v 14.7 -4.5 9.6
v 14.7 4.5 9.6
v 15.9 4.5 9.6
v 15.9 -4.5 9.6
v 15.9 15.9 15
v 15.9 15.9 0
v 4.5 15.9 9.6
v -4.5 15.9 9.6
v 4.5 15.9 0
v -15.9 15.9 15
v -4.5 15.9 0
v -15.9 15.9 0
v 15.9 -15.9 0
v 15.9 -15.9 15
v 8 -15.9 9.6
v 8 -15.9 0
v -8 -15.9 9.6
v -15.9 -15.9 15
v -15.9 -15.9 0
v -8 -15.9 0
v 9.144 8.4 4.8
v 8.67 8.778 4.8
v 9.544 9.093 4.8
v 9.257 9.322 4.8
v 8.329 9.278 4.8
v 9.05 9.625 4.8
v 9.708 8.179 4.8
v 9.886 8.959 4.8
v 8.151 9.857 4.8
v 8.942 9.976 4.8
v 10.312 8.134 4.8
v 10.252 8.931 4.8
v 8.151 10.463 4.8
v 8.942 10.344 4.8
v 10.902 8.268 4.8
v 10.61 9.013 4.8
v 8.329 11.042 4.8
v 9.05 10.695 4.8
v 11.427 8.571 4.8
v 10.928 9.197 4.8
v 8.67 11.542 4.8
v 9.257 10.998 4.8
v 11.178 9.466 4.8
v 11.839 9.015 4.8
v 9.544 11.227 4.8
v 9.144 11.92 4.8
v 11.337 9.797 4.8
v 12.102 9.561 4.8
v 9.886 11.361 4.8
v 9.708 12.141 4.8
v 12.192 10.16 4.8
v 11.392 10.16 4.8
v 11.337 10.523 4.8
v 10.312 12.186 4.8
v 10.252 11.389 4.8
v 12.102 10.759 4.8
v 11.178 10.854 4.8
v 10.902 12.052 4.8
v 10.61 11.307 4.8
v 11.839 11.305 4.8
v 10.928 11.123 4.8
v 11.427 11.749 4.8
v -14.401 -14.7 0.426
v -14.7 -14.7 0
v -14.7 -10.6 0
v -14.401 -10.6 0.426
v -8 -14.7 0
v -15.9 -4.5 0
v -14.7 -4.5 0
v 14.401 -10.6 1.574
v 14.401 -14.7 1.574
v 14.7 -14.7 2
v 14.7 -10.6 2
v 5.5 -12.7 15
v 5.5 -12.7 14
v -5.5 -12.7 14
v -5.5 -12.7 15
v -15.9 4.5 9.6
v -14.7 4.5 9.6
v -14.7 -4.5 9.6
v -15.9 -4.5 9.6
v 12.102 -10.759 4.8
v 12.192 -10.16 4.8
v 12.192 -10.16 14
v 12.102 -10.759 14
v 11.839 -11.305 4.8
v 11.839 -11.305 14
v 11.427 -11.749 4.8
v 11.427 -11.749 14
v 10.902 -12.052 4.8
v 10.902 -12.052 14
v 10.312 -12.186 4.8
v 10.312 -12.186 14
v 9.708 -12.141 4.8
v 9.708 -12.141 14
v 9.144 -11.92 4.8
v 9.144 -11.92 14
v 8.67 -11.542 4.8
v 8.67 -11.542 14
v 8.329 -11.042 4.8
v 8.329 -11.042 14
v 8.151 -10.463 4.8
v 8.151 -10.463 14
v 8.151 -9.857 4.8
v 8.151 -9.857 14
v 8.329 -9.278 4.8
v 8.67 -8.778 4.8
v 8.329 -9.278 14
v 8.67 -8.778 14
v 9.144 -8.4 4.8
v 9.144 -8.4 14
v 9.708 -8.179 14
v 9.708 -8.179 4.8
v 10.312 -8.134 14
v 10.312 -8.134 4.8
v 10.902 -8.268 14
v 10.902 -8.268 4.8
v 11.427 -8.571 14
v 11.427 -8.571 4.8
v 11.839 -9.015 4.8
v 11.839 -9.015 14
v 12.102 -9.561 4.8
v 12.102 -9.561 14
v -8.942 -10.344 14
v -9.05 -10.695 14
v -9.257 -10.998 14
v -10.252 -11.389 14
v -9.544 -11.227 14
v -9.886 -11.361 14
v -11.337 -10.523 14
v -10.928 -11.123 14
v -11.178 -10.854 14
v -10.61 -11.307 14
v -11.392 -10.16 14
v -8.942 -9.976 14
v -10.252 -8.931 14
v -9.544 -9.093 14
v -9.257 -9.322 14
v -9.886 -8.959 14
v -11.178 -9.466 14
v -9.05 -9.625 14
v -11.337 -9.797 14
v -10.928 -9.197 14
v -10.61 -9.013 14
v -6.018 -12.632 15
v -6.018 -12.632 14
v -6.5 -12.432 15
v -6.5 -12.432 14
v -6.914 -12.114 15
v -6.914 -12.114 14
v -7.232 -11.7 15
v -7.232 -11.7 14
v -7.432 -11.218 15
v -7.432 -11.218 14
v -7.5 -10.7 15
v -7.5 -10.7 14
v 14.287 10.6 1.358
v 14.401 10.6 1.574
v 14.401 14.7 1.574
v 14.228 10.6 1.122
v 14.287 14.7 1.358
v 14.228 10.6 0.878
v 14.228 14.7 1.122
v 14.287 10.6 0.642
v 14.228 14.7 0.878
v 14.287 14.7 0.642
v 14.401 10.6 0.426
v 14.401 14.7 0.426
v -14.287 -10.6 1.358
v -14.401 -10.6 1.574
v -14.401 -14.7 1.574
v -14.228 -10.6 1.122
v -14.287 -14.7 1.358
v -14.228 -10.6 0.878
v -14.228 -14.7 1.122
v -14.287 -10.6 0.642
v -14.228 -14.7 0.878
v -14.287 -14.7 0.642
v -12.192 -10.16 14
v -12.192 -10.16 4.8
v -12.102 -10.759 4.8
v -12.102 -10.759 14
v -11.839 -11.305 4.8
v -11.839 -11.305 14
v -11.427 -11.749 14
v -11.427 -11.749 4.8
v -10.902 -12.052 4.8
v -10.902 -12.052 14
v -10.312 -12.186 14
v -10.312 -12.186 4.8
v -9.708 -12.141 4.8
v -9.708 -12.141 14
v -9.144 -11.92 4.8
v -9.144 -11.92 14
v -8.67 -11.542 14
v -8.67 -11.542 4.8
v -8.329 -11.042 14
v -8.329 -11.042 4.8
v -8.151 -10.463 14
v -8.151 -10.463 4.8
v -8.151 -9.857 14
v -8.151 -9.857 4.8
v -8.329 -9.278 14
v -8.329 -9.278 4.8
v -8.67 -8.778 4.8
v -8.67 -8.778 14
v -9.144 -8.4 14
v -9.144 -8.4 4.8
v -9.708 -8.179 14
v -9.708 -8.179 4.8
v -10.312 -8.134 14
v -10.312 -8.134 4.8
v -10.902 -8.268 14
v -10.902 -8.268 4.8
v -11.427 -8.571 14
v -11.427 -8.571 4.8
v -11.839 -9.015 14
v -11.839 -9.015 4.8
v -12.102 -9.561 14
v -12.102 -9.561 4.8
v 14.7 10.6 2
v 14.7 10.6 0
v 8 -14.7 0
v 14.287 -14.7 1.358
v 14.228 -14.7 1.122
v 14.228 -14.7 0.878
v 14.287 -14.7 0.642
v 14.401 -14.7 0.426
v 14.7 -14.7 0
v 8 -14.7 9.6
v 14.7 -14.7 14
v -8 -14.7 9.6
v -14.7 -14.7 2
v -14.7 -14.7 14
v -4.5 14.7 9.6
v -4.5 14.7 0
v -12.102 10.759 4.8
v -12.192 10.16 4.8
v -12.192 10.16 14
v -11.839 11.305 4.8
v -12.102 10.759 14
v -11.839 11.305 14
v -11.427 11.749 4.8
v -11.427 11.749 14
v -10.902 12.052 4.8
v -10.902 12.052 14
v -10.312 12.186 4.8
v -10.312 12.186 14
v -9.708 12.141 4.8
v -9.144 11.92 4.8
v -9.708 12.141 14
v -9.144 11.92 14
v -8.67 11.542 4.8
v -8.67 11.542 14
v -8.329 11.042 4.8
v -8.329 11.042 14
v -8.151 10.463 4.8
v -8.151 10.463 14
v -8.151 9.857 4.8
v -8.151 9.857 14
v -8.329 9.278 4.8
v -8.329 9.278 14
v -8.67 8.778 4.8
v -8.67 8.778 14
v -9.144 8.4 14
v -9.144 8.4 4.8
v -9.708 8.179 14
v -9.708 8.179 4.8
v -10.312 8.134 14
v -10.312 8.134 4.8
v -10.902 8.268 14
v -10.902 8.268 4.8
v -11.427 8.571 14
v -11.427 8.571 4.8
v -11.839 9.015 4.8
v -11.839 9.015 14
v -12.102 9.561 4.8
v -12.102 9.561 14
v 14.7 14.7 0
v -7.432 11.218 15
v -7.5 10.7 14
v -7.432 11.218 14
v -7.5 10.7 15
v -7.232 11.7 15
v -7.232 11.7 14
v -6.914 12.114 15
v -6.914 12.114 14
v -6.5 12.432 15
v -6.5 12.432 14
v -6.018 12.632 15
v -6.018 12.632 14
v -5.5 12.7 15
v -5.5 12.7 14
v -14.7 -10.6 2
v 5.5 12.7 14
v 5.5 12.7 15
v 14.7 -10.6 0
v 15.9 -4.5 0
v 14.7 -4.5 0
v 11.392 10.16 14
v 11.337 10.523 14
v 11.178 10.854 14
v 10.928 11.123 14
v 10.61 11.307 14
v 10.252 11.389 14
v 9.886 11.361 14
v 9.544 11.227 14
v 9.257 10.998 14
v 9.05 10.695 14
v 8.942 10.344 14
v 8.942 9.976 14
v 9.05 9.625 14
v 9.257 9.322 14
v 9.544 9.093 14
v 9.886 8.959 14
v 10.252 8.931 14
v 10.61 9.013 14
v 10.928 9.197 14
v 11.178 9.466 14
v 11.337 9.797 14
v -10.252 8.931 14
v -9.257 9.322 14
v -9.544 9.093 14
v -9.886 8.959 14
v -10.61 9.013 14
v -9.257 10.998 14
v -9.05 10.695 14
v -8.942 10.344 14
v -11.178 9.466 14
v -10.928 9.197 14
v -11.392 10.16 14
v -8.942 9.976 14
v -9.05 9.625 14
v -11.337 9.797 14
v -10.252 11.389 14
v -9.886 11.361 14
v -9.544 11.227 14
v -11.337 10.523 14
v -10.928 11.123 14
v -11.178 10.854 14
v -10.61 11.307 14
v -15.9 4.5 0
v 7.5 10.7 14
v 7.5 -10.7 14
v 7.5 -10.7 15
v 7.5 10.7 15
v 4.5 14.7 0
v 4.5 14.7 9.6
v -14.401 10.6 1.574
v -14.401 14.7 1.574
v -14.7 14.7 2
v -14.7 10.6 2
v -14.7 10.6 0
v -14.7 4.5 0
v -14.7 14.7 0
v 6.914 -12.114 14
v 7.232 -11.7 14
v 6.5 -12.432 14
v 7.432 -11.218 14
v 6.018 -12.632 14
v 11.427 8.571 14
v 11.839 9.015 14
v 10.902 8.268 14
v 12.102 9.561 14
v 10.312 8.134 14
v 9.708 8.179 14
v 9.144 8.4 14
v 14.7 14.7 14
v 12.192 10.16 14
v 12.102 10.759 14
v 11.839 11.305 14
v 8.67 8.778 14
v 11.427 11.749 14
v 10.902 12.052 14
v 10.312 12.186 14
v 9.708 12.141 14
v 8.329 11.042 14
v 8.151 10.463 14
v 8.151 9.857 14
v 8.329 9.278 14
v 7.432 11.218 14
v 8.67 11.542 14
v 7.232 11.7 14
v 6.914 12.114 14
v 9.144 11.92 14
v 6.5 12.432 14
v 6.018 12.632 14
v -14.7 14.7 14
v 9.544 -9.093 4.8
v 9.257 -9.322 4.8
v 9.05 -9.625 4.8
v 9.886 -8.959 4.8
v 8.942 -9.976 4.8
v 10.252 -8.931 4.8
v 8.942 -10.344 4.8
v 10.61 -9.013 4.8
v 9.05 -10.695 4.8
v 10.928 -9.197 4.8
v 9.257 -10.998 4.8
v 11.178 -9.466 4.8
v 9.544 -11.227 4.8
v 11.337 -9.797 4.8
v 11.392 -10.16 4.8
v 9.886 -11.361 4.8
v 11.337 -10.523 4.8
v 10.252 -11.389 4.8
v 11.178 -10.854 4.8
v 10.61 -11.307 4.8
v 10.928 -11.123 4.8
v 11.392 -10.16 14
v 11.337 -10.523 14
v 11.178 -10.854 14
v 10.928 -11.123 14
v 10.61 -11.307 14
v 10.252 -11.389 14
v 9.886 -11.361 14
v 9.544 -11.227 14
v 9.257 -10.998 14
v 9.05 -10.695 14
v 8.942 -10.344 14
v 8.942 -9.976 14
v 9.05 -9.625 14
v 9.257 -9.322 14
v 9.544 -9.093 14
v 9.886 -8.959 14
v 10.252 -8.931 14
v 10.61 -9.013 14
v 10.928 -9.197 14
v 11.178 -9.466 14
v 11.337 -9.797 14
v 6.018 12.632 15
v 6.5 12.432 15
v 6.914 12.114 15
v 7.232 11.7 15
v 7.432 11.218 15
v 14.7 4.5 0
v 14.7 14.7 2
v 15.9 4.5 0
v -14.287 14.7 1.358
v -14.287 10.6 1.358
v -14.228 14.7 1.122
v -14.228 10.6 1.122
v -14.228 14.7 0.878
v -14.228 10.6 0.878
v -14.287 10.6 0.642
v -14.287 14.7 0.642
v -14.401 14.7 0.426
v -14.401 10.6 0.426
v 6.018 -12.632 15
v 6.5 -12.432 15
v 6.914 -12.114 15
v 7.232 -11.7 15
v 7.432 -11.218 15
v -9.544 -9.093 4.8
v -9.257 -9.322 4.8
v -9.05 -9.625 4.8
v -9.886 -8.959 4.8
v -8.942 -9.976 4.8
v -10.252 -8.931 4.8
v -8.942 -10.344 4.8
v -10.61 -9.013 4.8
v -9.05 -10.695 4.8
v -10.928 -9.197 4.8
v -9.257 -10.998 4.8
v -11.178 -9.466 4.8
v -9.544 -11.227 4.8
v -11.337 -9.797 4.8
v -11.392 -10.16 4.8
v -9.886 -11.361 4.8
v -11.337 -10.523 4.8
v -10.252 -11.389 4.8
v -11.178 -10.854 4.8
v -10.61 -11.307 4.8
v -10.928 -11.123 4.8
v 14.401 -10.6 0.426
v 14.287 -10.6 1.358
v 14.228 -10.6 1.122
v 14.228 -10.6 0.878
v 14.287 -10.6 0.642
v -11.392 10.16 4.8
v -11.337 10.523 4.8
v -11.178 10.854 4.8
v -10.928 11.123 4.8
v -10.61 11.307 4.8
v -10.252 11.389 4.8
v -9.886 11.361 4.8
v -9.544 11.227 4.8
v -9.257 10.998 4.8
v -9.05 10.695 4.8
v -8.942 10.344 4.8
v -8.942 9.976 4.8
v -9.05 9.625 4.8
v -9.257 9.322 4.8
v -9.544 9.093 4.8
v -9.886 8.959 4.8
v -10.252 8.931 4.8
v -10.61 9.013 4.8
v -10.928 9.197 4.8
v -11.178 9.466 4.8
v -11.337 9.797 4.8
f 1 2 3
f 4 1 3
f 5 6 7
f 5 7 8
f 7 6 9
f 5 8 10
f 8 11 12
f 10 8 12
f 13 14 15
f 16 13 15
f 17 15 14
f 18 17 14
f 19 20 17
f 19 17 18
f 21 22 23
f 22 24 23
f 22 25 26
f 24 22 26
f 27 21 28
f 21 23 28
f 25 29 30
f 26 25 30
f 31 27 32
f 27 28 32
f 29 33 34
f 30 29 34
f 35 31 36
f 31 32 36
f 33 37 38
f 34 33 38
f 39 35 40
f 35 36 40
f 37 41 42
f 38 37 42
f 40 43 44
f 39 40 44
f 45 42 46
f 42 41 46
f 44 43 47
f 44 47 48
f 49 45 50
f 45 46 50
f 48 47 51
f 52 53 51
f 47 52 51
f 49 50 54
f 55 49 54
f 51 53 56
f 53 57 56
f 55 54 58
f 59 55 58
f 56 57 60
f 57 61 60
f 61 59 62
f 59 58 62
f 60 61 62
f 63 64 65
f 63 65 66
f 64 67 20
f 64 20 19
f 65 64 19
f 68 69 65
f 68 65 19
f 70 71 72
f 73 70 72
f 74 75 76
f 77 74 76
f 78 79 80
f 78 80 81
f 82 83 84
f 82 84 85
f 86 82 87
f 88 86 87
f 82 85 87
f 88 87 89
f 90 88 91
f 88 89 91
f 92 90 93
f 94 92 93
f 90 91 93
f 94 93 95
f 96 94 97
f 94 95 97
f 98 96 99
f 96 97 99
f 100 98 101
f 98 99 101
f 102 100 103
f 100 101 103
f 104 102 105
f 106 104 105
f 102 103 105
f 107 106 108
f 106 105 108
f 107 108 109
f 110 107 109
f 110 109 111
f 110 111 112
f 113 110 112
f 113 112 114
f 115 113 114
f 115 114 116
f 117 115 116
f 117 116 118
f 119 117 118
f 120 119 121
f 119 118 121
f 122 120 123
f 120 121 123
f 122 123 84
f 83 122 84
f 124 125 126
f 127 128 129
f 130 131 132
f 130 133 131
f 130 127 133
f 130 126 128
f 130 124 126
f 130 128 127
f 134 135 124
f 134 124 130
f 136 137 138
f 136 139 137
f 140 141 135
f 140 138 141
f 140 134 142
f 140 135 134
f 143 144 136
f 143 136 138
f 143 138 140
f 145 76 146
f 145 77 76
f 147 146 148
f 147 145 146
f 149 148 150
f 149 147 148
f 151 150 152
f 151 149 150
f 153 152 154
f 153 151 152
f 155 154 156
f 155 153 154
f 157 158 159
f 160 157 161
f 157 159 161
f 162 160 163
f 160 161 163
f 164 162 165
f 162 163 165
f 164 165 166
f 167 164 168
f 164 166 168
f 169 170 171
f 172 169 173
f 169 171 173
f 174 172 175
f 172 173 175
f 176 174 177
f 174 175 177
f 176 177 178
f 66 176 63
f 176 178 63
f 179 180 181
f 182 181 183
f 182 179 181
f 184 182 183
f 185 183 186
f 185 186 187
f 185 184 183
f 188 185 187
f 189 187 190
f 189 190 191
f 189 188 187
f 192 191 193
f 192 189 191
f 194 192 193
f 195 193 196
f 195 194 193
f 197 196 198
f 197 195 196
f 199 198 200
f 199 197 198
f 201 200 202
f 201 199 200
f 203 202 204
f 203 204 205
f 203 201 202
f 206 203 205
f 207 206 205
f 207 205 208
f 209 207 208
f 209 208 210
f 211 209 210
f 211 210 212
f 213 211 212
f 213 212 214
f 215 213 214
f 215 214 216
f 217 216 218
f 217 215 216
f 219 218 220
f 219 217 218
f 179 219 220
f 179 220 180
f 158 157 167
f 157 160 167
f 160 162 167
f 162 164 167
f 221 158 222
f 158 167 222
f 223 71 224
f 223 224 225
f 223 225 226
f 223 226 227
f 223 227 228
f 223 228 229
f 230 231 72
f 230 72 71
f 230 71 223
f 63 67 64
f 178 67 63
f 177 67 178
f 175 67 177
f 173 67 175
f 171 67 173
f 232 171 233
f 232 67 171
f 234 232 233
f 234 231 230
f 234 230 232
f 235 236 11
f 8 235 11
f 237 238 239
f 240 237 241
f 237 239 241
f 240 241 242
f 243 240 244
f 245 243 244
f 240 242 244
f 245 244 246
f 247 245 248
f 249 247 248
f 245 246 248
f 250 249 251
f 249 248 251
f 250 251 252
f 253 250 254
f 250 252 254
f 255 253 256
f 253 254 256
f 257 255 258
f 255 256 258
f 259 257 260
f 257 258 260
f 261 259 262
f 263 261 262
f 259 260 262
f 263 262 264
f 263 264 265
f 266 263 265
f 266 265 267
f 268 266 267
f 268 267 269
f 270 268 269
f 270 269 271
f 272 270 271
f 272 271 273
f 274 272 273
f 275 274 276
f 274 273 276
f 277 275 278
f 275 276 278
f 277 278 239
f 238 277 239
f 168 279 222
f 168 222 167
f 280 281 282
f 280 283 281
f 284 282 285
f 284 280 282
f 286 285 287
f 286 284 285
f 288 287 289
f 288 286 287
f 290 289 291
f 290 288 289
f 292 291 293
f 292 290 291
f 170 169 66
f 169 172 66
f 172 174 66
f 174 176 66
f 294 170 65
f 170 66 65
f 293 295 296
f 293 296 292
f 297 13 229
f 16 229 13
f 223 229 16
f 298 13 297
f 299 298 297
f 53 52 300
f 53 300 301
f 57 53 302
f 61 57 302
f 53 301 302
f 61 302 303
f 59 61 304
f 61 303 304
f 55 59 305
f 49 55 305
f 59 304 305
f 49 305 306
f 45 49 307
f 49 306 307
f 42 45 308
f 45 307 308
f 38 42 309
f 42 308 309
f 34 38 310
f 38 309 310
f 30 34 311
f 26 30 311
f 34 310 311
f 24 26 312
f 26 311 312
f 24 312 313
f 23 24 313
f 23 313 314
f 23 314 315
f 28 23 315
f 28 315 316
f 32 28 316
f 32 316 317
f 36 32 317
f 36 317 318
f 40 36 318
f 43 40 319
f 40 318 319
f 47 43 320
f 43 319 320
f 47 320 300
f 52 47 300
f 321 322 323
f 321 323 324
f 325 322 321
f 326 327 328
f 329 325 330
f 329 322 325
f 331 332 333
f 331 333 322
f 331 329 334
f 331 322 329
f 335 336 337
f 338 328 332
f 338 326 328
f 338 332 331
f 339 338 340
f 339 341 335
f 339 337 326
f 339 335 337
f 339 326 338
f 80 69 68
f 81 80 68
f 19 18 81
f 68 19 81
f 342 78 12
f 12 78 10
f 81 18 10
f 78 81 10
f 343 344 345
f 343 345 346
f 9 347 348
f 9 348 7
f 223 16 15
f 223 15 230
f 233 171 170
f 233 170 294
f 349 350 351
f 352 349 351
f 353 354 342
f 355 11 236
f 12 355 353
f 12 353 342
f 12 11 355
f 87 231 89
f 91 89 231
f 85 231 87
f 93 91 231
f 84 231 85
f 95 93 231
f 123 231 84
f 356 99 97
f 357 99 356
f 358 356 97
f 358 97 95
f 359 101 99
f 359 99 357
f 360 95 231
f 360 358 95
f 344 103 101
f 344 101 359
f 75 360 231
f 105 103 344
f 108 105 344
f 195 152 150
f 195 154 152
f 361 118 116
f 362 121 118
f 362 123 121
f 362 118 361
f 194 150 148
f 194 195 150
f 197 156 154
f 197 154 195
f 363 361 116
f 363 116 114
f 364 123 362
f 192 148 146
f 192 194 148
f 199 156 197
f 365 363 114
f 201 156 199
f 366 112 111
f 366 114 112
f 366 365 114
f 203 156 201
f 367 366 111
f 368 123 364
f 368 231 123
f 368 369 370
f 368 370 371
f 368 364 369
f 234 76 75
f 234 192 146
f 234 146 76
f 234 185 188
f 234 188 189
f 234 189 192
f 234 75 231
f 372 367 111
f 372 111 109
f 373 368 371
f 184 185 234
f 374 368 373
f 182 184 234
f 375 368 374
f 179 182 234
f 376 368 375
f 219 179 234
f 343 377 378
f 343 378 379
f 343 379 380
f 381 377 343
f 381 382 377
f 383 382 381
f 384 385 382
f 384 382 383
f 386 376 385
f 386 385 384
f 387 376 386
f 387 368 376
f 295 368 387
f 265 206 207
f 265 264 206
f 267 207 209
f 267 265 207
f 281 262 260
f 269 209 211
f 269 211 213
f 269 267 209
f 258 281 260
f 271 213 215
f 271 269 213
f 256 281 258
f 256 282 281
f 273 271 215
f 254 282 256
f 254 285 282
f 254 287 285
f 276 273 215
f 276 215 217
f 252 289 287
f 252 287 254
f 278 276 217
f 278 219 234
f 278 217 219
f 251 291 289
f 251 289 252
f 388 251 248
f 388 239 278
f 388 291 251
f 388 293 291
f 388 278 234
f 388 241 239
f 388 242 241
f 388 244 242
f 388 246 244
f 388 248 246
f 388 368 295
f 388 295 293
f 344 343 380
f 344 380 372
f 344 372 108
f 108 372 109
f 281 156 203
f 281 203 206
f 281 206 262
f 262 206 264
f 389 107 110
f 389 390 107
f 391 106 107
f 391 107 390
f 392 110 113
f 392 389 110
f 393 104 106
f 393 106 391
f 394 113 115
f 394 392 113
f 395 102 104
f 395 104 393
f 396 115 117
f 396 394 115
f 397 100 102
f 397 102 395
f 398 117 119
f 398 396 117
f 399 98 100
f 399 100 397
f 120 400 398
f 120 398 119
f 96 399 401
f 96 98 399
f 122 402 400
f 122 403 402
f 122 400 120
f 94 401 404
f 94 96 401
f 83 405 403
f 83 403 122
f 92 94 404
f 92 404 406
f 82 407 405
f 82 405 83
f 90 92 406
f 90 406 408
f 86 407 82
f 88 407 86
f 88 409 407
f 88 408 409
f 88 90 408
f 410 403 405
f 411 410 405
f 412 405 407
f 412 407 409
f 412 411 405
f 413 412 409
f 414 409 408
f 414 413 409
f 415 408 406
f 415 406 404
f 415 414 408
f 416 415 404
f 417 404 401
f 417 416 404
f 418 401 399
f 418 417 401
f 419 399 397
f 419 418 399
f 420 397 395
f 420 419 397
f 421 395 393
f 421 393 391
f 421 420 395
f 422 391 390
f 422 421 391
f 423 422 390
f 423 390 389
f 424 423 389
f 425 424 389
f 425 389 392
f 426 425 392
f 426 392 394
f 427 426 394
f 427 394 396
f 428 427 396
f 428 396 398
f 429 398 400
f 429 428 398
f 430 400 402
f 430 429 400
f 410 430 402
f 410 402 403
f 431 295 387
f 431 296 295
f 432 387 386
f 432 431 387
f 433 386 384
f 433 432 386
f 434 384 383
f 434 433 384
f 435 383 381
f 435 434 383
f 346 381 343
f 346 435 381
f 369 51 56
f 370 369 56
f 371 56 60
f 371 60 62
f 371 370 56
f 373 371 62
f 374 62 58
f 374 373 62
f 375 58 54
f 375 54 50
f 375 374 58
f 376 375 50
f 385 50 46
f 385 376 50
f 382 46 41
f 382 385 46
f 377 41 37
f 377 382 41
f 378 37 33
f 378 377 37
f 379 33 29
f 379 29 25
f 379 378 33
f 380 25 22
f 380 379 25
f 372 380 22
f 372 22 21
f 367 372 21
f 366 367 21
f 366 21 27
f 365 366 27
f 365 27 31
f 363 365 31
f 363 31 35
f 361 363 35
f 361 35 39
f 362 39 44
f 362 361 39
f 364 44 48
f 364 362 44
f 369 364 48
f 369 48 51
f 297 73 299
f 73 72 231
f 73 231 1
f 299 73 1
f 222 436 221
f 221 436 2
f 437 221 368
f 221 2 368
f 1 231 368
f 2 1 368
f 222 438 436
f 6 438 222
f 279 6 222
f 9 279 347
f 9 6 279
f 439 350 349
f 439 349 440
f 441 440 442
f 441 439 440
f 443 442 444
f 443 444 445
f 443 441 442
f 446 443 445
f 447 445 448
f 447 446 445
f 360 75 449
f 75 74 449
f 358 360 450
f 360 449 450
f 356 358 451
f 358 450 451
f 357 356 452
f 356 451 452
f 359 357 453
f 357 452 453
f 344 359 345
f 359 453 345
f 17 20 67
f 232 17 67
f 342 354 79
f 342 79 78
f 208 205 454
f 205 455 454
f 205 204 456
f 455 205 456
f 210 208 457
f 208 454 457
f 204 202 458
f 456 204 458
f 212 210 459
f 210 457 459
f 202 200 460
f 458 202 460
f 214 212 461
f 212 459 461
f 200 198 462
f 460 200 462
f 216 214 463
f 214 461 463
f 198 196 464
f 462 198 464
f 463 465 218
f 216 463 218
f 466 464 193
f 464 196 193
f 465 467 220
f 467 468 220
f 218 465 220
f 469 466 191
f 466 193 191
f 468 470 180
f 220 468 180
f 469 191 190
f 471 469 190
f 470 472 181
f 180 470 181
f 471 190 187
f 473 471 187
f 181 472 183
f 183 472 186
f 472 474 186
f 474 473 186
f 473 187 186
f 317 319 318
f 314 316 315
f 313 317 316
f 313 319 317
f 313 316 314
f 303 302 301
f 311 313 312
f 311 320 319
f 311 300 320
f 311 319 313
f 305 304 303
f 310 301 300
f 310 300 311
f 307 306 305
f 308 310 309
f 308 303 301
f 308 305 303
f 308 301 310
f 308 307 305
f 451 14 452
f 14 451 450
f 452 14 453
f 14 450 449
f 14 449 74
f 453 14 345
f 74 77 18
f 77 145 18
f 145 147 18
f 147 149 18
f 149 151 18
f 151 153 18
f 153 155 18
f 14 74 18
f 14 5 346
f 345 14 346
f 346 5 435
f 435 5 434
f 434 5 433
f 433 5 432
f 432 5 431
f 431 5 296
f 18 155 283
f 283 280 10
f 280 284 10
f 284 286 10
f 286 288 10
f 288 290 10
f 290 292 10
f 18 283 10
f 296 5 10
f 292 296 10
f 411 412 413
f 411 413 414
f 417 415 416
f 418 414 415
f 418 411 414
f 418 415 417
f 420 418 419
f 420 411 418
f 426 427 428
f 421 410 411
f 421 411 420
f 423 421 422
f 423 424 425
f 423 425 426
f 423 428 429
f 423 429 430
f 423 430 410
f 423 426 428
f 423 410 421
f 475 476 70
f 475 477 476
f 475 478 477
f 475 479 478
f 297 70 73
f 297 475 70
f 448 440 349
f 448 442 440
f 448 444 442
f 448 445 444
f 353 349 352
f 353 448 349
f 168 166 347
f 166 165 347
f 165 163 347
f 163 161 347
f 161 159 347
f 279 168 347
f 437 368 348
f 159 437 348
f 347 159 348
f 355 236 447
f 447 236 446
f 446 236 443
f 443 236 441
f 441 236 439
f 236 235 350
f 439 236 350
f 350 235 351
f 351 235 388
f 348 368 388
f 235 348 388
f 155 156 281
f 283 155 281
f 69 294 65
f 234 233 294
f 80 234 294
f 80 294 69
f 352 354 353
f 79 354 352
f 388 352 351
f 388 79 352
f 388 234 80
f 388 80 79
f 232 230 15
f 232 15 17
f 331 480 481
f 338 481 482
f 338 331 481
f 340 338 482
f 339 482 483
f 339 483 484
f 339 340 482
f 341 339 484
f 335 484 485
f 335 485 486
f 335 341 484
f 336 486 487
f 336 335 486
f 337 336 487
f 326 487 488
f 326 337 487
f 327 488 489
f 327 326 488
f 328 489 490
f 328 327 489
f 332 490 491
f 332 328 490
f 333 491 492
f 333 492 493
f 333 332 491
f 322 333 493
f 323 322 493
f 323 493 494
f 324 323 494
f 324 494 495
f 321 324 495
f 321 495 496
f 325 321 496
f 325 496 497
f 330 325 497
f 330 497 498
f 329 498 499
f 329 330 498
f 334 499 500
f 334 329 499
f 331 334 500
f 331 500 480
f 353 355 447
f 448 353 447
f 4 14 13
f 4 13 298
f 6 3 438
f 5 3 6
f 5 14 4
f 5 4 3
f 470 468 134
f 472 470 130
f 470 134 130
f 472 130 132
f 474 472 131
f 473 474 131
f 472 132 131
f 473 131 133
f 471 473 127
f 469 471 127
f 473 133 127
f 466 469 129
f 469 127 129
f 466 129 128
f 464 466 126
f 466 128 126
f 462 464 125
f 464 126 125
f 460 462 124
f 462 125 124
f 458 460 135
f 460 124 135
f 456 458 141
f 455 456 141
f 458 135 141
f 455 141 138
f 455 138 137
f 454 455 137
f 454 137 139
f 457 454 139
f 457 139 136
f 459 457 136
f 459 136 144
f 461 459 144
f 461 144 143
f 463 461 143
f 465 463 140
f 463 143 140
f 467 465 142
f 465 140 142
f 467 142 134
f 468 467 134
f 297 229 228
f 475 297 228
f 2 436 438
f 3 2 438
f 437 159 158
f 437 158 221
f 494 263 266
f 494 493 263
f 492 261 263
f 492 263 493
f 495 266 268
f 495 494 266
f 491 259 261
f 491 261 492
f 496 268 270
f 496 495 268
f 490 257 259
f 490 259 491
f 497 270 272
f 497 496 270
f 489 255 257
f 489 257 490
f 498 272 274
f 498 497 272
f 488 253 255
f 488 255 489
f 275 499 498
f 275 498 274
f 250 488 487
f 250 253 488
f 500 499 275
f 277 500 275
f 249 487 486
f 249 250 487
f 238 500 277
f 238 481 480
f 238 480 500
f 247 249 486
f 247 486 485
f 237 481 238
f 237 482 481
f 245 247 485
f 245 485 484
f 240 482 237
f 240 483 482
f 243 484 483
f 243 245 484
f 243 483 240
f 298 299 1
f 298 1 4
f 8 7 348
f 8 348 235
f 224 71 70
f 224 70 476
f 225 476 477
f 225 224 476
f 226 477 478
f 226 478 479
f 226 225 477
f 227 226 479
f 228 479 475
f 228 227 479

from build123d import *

# Parameters (mm, degrees)
SKETCH007_W                 = 31.8
SKETCH007_H                 = 31.8
PAD006_DEPTH                = 1
SKETCH009_W                 = 15
SKETCH009_H                 = 25.4
POCKET001_DEPTH             = 1.001
SKETCH010_R                 = 2.032
SKETCH010_R_2               = 1.232
PAD008_DEPTH                = 9.2
SKETCH010_MIRRORED009_2_R   = 2.032
SKETCH010_MIRRORED009_2_R_2 = 1.232
PAD008_MIRRORED009_2_DEPTH  = 9.2
SKETCH027_W                 = 31.8
SKETCH027_H                 = 31.8
SKETCH027_W_2               = 29.4
SKETCH027_H_2               = 29.4
PAD016_DEPTH                = 14
PAD017_DEPTH                = 5.3
PAD017_MIRRORED025_2_DEPTH  = 5.3
SKETCH029_W                 = 9
SKETCH029_H                 = 1.5
SKETCH029_W_2               = 16
POCKET010_DEPTH             = 9.6
SKETCH030_W                 = 1.5
SKETCH030_H                 = 9
POCKET011_DEPTH             = 9.6
FILLET013_R                 = 2
BODY002_PLACEMENT_ANGLE     = 180


with BuildPart() as part:
    # Sketch007 → Pad006 (new body)
    with BuildSketch(Plane.XY):
        Rectangle(SKETCH007_W, SKETCH007_H)
    extrude(amount=PAD006_DEPTH)

    # Sketch009 → Pocket001 (cut, through all)
    with BuildSketch(Plane.XY.offset(1)):
        Rectangle(SKETCH009_W, SKETCH009_H)
    extrude(amount=-POCKET001_DEPTH, mode=Mode.SUBTRACT)

    # Sketch010 (on Face5 of Pocket001) → Pad008 (join)
    with BuildSketch(Plane.XY.offset(1)):
        with Locations((10.16, 10.16)):
            Circle(SKETCH010_R)
        with Locations((10.16, 10.16)):
            Circle(SKETCH010_R_2, mode=Mode.SUBTRACT)
    pad008 = extrude(amount=PAD008_DEPTH)

    # Sketch010 Mirrored009 2 → Pad008 Mirrored009 2 (add)
    with BuildSketch(Plane(origin=(0, 0, 1), x_dir=(-1, 0, 0), z_dir=(0, 0, -1))):
        with Locations((10.16, 10.16)):
            Circle(SKETCH010_MIRRORED009_2_R)
        with Locations((10.16, 10.16)):
            Circle(SKETCH010_MIRRORED009_2_R_2, mode=Mode.SUBTRACT)
    pad008_mirrored009_2 = extrude(amount=-PAD008_MIRRORED009_2_DEPTH)

    # Mirrored010: Pad008, Pad008 Mirrored009 2 across Sketch010 H_Axis
    add(pad008.mirror(Plane(origin=(0, 0, 1), x_dir=(0, 0, 1), z_dir=(0, 1, 0))))
    add(pad008_mirrored009_2.mirror(Plane(origin=(0, 0, 1), x_dir=(0, 0, 1), z_dir=(0, 1, 0))))

    # Sketch027 (on Face5 of MultiTransform006) → Pad016 (join)
    with BuildSketch(Plane.XY.offset(1)):
        Rectangle(SKETCH027_W, SKETCH027_H)
        Rectangle(SKETCH027_W_2, SKETCH027_H_2, mode=Mode.SUBTRACT)
    extrude(amount=PAD016_DEPTH)

    # Sketch028 (on Face14 of Pad016) → Pad017 (join)
    with BuildSketch(Plane.XZ.offset(15.9)):
        with BuildLine():
            Line((-14.7, 13), (-14.7, 15))
            Line((-14.7, 15), (-14.401415, 14.573576))
            ThreePointArc((-14.401415, 13.426424), (-14.220567, 14), (-14.401415, 14.573576))
            Line((-14.401415, 13.426424), (-14.7, 13))
        make_face()
    pad017 = extrude(amount=-PAD017_DEPTH)

    # Sketch028 Mirrored025 2 → Pad017 Mirrored025 2 (add)
    with BuildSketch(Plane(origin=(0, -15.9, 0), x_dir=(-1, 0, 0), z_dir=(0, 1, 0))):
        with BuildLine():
            Line((-14.7, 13), (-14.7, 15))
            Line((-14.7, 15), (-14.401415, 14.573576))
            ThreePointArc((-14.401415, 13.426424), (-14.220567, 14), (-14.401415, 14.573576))
            Line((-14.401415, 13.426424), (-14.7, 13))
        make_face()
    pad017_mirrored025_2 = extrude(amount=PAD017_MIRRORED025_2_DEPTH)

    # Mirrored026: Pad017, Pad017 Mirrored025 2 across XZ
    add(pad017.mirror(Plane.XZ))
    add(pad017_mirrored025_2.mirror(Plane.XZ))

    # Sketch029 (on Face23 of MultiTransform012) → Pocket010 (cut)
    with BuildSketch(Plane.XY.offset(15)):
        with Locations((0, 15.15)):
            Rectangle(SKETCH029_W, SKETCH029_H)
        with Locations((0, -15.15)):
            Rectangle(SKETCH029_W_2, SKETCH029_H)
    extrude(amount=-POCKET010_DEPTH, mode=Mode.SUBTRACT)

    # Sketch030 (on Face18 of Pocket010) → Pocket011 (cut)
    with BuildSketch(Plane.XY.offset(15)):
        with Locations((15.15, 0)):
            Rectangle(SKETCH030_W, SKETCH030_H)
    pocket011 = extrude(amount=-POCKET011_DEPTH, mode=Mode.SUBTRACT)

    # Mirrored027: Pocket011 across Sketch030 V_Axis
    add(pocket011.mirror(Plane(origin=(0, 0, 15), x_dir=(0, 0, 1), z_dir=(1, 0, 0))), mode=Mode.SUBTRACT)

    # Fillet013
    fillet013_edges = [part.edges().sort_by_distance(p)[0] for p in [
        (7.5, 12.7, 0.5),
        (-7.5, 12.7, 0.5),
        (7.5, -12.7, 0.5),
        (-7.5, -12.7, 0.5),
    ]]
    fillet(fillet013_edges, radius=FILLET013_R)


with BuildPart() as part_1:
    # Body002 placement: moved
    add(part.part.moved(Location((0, 0, 15))).rotate(Axis((0, 0, 15), (0, 1, 0)), BODY002_PLACEMENT_ANGLE))


solid = part_1.part
